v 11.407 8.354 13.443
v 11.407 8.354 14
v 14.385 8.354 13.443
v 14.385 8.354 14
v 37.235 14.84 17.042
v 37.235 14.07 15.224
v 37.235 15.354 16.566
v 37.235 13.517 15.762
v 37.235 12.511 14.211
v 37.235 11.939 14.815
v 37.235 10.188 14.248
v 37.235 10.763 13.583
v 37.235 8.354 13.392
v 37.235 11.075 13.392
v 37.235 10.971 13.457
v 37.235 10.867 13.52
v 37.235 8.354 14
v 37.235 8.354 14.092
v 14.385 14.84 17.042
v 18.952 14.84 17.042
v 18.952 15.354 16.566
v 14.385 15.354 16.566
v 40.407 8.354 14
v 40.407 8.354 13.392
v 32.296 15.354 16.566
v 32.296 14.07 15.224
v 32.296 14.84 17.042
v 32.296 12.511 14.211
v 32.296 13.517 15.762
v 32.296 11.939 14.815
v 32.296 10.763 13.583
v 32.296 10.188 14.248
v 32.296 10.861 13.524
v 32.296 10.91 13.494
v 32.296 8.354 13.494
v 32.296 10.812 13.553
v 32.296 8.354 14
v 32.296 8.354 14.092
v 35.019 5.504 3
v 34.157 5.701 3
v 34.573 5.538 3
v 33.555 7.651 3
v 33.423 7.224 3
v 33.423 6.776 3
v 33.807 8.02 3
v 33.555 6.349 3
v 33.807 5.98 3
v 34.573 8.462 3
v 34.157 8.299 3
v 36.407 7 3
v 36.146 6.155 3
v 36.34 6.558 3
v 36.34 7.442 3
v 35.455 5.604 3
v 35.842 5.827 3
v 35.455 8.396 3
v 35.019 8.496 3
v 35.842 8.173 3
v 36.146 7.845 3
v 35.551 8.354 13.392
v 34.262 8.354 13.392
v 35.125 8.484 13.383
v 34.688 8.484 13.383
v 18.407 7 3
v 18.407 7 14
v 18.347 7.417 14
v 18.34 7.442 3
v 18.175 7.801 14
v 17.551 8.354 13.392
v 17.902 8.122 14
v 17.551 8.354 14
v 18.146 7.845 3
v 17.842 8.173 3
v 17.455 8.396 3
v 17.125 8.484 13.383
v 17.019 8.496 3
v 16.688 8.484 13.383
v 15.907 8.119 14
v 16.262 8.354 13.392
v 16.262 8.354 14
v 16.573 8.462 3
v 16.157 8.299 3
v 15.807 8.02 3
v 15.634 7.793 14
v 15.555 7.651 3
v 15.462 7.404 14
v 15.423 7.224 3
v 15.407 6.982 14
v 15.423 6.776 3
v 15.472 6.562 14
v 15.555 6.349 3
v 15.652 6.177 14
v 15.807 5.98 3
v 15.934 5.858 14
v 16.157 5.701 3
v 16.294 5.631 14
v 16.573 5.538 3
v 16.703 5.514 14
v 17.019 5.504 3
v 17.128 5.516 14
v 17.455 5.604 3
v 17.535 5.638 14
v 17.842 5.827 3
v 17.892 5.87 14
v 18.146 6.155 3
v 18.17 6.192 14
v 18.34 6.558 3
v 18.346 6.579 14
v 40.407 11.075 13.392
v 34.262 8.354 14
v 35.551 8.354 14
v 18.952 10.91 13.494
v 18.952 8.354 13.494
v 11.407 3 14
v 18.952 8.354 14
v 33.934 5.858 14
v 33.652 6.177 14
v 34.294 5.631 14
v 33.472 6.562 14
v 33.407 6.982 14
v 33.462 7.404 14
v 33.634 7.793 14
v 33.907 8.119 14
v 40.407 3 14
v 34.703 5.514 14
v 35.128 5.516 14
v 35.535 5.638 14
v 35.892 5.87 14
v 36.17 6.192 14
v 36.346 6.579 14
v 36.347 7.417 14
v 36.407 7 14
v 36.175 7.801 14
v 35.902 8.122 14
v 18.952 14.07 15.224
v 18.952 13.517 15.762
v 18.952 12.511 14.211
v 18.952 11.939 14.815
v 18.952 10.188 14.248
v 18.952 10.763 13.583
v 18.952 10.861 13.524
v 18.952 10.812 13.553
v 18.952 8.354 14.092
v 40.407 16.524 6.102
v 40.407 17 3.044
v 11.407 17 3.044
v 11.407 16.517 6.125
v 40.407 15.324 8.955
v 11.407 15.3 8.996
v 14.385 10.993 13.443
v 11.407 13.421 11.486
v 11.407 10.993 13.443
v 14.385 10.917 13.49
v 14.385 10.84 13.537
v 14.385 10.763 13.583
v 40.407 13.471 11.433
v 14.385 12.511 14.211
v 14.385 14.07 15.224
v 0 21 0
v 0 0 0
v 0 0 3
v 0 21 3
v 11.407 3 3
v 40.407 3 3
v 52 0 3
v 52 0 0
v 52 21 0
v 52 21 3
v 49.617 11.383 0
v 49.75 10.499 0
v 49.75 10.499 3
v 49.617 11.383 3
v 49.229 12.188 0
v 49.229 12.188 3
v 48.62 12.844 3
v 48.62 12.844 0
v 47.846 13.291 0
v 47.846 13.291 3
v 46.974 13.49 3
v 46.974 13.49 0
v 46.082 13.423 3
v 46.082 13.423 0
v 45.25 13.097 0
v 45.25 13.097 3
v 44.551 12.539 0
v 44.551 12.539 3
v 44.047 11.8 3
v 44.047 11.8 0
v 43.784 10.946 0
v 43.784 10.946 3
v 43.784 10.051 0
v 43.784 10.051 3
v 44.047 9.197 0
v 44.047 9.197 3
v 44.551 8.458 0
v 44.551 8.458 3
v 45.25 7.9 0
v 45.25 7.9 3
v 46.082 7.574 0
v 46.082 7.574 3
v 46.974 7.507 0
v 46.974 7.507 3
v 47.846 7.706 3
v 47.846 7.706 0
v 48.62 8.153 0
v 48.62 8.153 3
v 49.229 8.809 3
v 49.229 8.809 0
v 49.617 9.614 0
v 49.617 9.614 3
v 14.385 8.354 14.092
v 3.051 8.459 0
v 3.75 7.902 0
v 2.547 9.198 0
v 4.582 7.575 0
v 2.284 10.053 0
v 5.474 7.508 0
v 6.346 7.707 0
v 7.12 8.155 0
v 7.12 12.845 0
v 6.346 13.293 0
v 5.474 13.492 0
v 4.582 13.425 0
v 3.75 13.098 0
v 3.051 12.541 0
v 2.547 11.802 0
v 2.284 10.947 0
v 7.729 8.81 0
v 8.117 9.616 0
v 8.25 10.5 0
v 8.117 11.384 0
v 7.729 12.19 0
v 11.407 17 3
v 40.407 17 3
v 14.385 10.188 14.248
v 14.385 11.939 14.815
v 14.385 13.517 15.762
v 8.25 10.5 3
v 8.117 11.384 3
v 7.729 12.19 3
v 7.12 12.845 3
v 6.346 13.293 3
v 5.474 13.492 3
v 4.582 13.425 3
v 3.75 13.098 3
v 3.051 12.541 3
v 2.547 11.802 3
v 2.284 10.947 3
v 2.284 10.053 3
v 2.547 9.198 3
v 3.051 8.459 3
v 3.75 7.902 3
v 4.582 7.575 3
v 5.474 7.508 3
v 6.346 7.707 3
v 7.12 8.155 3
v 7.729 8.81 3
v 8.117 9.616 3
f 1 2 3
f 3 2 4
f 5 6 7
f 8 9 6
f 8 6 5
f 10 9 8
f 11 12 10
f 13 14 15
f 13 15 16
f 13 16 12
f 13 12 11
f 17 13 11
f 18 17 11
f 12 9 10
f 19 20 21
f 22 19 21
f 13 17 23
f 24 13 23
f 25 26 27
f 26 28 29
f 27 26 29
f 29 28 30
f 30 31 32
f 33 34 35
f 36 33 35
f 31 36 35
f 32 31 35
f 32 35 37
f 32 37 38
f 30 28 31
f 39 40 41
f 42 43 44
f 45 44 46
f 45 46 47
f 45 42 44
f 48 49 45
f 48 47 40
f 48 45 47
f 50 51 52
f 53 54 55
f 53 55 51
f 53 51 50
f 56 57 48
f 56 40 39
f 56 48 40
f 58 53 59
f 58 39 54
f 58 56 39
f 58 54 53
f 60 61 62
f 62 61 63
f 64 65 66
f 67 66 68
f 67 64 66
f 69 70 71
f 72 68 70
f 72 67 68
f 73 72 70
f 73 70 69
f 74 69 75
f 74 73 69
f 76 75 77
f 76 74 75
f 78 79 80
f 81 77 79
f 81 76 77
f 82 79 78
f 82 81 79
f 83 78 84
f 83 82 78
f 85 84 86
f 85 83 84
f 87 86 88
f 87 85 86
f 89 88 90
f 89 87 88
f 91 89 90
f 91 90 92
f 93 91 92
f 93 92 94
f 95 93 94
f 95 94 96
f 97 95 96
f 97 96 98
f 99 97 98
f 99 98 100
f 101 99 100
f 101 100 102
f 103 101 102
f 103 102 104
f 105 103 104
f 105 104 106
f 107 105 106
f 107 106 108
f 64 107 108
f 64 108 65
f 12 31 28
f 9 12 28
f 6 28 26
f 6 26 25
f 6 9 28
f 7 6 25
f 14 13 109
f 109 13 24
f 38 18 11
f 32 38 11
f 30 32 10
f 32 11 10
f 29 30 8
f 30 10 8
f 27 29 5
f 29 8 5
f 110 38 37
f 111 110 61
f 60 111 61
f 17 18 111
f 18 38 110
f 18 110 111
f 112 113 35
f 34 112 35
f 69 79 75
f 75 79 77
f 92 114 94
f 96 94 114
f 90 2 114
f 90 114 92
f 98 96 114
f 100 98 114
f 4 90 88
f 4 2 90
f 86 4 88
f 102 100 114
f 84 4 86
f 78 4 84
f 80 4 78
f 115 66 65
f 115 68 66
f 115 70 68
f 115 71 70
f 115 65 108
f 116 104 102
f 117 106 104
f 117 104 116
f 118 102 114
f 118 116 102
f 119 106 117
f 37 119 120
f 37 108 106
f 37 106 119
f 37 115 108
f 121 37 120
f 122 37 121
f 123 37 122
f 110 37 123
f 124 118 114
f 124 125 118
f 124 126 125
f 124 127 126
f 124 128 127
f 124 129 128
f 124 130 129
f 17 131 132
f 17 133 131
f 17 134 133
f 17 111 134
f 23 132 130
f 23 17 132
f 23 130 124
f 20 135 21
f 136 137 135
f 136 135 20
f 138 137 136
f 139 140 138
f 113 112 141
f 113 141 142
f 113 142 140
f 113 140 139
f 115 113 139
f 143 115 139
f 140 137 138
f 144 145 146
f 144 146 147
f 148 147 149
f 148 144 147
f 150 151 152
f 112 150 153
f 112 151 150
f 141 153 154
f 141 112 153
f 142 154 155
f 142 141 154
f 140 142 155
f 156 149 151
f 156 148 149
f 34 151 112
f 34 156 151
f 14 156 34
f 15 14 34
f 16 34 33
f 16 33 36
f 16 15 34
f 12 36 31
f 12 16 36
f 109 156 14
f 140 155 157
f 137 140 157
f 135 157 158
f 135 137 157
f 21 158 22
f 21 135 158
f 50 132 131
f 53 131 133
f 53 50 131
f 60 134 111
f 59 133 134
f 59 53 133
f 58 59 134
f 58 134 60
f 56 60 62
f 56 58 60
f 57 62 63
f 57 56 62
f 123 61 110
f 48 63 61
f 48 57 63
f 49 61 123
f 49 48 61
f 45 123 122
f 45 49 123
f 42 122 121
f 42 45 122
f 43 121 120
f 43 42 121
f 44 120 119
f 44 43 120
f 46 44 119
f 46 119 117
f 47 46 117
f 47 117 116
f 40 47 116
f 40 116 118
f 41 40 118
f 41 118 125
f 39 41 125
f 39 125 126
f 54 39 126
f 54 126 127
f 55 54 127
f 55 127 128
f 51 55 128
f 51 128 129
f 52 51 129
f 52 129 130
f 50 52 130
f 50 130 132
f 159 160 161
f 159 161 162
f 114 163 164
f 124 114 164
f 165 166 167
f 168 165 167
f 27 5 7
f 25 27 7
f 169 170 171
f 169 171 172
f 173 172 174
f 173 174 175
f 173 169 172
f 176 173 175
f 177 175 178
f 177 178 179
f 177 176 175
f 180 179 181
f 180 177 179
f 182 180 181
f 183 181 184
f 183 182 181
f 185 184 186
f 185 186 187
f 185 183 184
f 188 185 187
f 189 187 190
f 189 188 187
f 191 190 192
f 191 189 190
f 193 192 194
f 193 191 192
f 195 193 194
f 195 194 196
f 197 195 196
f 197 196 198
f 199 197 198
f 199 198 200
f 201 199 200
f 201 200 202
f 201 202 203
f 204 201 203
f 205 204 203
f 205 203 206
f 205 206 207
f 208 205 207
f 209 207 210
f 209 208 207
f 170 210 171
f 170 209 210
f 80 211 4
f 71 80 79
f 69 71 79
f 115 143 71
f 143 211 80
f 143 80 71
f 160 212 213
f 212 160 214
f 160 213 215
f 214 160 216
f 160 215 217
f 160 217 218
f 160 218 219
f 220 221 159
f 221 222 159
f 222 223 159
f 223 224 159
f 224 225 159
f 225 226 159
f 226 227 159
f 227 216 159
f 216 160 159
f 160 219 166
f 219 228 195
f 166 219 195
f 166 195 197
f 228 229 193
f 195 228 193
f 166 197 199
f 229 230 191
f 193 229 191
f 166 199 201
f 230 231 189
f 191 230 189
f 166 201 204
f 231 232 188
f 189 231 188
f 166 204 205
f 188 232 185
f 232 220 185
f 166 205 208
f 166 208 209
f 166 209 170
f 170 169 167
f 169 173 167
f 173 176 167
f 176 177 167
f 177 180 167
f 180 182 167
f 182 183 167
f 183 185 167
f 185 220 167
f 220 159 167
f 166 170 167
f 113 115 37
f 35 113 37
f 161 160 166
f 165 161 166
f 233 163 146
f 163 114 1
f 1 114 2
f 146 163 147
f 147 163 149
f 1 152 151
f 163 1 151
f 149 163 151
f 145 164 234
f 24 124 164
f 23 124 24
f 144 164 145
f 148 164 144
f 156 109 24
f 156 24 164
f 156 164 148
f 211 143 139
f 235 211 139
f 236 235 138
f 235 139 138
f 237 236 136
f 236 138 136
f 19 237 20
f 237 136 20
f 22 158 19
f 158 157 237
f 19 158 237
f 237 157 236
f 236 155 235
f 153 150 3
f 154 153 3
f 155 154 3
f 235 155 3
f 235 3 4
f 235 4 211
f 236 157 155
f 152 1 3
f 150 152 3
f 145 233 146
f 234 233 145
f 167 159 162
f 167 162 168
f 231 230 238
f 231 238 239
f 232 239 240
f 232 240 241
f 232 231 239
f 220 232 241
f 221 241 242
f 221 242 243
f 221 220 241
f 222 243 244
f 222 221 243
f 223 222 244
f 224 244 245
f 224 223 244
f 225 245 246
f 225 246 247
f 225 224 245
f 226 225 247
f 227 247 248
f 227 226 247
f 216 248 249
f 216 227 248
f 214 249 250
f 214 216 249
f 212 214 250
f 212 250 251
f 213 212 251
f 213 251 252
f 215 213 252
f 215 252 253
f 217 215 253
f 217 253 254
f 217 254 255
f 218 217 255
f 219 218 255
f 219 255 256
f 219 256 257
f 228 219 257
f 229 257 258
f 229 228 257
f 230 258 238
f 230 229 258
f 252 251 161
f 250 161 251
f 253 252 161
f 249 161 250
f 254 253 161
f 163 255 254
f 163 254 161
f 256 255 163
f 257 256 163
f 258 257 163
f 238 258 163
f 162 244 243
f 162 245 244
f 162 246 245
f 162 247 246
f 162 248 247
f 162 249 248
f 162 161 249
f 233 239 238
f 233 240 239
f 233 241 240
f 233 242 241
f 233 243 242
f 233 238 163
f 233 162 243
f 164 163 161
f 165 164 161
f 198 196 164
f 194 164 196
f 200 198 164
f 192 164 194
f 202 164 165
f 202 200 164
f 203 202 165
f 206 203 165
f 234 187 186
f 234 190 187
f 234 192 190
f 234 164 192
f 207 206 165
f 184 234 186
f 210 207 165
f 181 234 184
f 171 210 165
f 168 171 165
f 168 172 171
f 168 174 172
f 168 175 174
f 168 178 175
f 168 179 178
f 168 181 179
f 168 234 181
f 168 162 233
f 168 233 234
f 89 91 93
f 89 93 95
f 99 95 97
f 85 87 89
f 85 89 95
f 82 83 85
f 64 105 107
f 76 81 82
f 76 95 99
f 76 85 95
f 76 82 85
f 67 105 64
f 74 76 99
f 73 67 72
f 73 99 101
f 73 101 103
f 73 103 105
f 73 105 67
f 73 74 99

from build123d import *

# Parameters (mm, degrees)
SKETCH_W        = 52
SKETCH_H        = 21
SKETCH_R        = 3
PAD_DEPTH       = 3
SKETCH001_W     = 29
SKETCH001_H     = 14
SKETCH001_R     = 1.5
PAD001_DEPTH    = 11
POCKET_DEPTH    = 100
PAD002_DEPTH    = 29
SKETCH004_W     = 3.506214
SKETCH004_H     = 4.561438
SKETCH004_W_2   = 13.343595
SKETCH004_H_2   = 5.385539
SKETCH004_W_3   = 3.315279
SKETCH004_H_3   = 4.172676
POCKET001_DEPTH = 7


with BuildPart() as part:
    # Sketch → Pad (new body)
    with BuildSketch(Plane.XY):
        with Locations((26, 10.5)):
            Rectangle(SKETCH_W, SKETCH_H)
        with Locations((5.25, 10.5)):
            Circle(SKETCH_R, mode=Mode.SUBTRACT)
        with Locations((46.75, 10.498532)):
            Circle(SKETCH_R, mode=Mode.SUBTRACT)
    extrude(amount=PAD_DEPTH)

    # Sketch001 → Pad001 (new body)
    with BuildSketch(Plane.XY.offset(3)):
        with Locations((25.906526, 10)):
            Rectangle(SKETCH001_W, SKETCH001_H)
        with Locations((16.906526, 7)):
            Circle(SKETCH001_R, mode=Mode.SUBTRACT)
        with Locations((34.906526, 7)):
            Circle(SKETCH001_R, mode=Mode.SUBTRACT)
    extrude(amount=PAD001_DEPTH)

    # Sketch002 → Pocket (cut)
    with BuildSketch(Plane.YZ.offset(40.406526)):
        with BuildLine():
            ThreePointArc((17, 3.044285), (15.003799, 9.482974), (10, 14))
            Line((10, 14), (17, 14))
            Line((17, 14), (17, 3.044285))
        make_face()
    extrude(amount=-POCKET_DEPTH, mode=Mode.SUBTRACT)

    # Sketch003 → Pad002 (new body)
    with BuildSketch(Plane.YZ.offset(40.406526)):
        with BuildLine():
            Line((8.354331, 14.091598), (8.354331, 13.391598))
            ThreePointArc((8.354331, 13.391598), (12.257184, 14.090805), (15.354331, 16.566454))
            Line((14.840477, 17.041801), (15.354331, 16.566454))
            ThreePointArc((8.354331, 14.091598), (11.93941, 14.814785), (14.840477, 17.041801))
        make_face()
    extrude(amount=-PAD002_DEPTH)

    # Sketch004 → Pocket001 (cut)
    with BuildSketch(Plane.XZ.offset(-8.354331)):
        with Locations((38.987986, 15.672686)):
            Rectangle(SKETCH004_W, SKETCH004_H)
        with Locations((25.624218, 16.18705)):
            Rectangle(SKETCH004_W_2, SKETCH004_H_2)
        with Locations((12.72779, 15.529459)):
            Rectangle(SKETCH004_W_3, SKETCH004_H_3)
    extrude(amount=-POCKET001_DEPTH, mode=Mode.SUBTRACT)


solid = part.part
